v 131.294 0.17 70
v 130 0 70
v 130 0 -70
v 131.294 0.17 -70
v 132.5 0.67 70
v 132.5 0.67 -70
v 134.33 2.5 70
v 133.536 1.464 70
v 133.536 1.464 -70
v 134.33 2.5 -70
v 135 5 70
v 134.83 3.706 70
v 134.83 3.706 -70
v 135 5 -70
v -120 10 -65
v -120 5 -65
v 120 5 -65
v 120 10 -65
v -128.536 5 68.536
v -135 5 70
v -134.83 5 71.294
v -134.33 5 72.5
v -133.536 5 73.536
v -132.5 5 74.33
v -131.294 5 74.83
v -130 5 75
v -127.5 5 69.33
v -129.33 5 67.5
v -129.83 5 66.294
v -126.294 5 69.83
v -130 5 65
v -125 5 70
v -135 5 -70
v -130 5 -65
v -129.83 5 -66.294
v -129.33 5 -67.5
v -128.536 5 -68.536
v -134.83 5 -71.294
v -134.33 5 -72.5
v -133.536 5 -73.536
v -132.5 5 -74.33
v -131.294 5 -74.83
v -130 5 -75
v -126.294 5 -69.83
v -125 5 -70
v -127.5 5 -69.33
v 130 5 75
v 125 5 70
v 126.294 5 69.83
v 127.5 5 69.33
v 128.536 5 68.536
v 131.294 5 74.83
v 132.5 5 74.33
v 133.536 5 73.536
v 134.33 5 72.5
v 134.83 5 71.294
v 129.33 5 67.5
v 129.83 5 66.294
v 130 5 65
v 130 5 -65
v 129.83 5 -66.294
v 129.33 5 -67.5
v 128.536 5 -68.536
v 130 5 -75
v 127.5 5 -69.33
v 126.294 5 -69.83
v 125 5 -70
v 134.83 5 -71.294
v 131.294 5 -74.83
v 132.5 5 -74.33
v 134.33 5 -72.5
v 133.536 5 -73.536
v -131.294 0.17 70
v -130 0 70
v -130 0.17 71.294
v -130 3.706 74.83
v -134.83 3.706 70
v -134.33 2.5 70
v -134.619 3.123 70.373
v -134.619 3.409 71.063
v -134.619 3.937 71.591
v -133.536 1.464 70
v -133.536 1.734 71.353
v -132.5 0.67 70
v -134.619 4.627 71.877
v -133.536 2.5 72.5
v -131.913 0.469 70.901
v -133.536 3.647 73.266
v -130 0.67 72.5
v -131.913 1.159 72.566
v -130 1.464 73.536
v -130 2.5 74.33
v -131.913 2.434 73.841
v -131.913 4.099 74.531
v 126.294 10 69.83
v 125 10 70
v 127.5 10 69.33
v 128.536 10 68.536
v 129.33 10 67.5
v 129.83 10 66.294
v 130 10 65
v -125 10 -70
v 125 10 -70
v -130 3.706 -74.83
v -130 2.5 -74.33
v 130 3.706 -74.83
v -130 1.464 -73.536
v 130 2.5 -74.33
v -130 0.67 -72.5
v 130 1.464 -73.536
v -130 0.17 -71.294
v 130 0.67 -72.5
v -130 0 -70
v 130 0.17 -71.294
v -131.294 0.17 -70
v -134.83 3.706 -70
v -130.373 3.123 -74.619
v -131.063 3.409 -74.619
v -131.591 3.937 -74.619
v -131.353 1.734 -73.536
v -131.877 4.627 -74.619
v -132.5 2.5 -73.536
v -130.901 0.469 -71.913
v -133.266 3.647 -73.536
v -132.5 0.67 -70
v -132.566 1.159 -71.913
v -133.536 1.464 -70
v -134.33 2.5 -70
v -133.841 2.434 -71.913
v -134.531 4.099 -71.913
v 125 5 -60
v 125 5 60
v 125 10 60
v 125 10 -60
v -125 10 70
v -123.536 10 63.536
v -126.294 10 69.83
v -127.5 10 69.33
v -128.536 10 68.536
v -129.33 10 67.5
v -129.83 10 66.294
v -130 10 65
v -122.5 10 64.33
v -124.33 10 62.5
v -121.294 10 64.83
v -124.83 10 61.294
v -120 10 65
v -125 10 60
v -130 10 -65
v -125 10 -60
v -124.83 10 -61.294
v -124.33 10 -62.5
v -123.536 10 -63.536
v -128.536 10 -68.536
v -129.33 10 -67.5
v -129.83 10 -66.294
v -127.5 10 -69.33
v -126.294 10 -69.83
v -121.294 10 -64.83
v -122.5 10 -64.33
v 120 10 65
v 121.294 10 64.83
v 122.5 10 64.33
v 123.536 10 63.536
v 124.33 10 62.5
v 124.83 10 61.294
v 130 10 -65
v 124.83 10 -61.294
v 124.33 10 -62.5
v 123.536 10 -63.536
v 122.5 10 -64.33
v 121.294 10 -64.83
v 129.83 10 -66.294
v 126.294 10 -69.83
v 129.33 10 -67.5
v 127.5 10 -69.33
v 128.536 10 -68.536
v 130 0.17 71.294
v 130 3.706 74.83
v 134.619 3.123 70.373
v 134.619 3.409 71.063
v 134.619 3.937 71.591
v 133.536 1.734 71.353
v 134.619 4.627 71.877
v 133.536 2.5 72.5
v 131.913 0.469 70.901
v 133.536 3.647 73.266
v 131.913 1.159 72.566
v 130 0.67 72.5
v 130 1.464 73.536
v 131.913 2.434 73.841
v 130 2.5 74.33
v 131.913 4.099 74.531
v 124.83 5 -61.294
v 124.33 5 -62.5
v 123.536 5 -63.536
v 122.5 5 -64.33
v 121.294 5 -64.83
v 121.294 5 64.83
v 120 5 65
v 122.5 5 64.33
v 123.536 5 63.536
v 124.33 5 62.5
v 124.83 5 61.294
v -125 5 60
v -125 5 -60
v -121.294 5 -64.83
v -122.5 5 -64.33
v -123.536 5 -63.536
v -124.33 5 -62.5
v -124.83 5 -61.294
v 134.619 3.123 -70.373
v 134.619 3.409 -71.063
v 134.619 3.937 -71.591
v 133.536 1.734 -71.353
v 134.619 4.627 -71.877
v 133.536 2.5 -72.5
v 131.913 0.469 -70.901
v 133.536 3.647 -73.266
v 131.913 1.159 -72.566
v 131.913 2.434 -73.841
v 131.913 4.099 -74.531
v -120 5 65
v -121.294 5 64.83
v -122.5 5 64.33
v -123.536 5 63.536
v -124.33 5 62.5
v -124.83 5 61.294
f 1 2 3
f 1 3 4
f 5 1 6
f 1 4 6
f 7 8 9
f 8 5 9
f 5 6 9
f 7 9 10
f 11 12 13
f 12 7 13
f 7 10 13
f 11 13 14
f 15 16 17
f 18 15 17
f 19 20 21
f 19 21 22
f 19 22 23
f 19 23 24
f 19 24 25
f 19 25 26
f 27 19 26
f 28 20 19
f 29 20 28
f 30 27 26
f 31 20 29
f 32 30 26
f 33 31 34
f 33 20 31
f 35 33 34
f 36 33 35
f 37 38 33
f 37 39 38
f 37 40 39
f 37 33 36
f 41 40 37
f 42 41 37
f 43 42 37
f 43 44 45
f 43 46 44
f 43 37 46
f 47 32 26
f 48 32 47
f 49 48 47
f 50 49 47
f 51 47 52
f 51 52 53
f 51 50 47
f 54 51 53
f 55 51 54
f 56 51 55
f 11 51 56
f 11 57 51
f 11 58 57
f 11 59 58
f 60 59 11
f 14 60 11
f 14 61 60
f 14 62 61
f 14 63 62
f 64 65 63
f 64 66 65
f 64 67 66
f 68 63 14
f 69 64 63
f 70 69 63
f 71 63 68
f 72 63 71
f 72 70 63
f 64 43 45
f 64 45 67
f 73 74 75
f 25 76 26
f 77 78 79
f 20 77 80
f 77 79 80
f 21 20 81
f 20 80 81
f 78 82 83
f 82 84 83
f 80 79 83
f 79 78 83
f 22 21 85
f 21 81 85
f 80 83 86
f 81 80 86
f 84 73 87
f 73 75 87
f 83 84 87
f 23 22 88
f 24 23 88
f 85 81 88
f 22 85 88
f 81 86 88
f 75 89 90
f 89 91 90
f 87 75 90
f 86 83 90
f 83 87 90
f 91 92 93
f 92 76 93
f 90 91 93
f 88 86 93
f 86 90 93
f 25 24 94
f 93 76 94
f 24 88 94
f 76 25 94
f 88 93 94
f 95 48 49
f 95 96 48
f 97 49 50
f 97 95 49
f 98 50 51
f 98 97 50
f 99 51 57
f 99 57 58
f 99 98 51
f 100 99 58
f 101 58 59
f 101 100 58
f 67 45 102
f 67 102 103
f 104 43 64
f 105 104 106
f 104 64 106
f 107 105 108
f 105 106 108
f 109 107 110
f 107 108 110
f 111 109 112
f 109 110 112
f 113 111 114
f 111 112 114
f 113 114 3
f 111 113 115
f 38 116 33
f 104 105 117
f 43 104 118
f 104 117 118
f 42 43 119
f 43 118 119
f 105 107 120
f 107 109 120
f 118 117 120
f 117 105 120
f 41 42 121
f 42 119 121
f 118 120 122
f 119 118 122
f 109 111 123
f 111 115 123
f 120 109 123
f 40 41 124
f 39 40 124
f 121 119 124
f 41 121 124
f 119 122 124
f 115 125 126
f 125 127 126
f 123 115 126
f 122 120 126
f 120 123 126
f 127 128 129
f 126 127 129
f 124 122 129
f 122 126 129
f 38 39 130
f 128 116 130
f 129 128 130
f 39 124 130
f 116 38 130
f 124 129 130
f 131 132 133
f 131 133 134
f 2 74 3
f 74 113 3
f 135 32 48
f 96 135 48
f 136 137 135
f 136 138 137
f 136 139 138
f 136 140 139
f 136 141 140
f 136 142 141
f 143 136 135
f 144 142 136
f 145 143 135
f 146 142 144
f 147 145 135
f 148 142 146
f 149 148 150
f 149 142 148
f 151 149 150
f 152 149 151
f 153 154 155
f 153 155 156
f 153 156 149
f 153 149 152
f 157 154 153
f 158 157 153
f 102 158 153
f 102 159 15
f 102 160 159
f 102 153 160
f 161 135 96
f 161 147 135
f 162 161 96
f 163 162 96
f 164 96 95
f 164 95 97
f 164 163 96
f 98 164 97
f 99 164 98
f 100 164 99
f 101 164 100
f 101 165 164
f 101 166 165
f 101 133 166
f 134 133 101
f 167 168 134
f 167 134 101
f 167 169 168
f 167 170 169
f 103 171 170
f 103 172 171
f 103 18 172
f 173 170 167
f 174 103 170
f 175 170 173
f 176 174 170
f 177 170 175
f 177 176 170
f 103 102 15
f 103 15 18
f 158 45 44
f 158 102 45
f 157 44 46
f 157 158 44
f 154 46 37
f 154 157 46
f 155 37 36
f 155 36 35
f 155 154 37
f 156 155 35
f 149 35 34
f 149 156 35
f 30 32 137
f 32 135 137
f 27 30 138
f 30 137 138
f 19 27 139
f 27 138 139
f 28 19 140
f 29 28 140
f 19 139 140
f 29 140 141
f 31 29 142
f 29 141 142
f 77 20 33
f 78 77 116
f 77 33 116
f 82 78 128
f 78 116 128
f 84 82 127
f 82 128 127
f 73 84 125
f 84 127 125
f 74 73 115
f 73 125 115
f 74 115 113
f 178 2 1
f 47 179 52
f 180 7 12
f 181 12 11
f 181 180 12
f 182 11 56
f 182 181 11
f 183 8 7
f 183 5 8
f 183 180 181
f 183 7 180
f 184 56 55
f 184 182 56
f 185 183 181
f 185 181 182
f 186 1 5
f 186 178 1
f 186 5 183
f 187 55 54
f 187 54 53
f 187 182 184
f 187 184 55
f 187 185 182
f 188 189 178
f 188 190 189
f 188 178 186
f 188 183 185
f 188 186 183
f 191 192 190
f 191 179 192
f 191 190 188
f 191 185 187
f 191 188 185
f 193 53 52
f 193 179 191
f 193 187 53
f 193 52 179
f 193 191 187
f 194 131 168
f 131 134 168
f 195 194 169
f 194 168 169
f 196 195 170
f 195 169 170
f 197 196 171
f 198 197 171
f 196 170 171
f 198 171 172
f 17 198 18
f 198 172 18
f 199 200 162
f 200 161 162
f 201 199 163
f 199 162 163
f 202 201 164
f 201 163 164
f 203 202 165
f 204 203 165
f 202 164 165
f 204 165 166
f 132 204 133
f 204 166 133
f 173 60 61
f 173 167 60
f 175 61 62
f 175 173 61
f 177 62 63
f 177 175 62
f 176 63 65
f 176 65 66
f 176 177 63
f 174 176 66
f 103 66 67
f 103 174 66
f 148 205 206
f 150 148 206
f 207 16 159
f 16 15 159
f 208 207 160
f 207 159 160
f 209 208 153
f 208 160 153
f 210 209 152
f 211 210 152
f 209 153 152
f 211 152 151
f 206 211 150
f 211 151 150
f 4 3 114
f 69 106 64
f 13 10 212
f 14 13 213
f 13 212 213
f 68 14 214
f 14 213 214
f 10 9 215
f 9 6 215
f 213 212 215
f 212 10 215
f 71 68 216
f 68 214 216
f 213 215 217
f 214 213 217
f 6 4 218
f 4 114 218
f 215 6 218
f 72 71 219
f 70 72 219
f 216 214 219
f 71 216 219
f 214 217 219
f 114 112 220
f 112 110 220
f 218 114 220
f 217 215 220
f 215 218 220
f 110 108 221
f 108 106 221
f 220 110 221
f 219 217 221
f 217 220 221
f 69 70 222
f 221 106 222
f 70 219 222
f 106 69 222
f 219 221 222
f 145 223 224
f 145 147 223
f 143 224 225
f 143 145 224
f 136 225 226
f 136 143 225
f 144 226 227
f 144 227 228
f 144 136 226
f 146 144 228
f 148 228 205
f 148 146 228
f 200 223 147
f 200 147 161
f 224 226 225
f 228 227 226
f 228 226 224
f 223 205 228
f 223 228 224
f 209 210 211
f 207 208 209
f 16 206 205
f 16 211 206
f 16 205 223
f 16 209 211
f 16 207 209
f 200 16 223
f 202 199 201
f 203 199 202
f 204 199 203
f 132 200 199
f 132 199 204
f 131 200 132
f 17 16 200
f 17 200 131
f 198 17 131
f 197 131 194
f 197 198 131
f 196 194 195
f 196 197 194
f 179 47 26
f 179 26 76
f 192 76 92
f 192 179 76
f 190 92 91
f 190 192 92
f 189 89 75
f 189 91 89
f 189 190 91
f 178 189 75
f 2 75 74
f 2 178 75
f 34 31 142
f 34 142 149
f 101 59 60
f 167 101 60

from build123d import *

# Parameters (mm, degrees)
SKETCH1_W           = 270
SKETCH1_H           = 150
BOSS_EXTRUDE2_DEPTH = 5
SKETCH4_W           = 260
SKETCH4_H           = 140
SKETCH4_W_2         = 250
SKETCH4_H_2         = 130
BOSS_EXTRUDE3_DEPTH = 5
FILLET1_R           = 5


with BuildPart() as part:
    # Sketch1 → Boss-Extrude2 (new body)
    with BuildSketch(Plane(origin=(0, 0, 0), x_dir=(1, 0, 0), z_dir=(0, 1, 0))):
        Rectangle(SKETCH1_W, SKETCH1_H)
    extrude(amount=BOSS_EXTRUDE2_DEPTH)

    # Sketch4 → Boss-Extrude3 (add)
    with BuildSketch(Plane(origin=(0, 5, 0), x_dir=(1, 0, 0), z_dir=(0, 1, 0))):
        Rectangle(SKETCH4_W, SKETCH4_H)
        Rectangle(SKETCH4_W_2, SKETCH4_H_2, mode=Mode.SUBTRACT)
    extrude(amount=BOSS_EXTRUDE3_DEPTH)

    # Fillet1
    fillet1_edges = [part.edges().sort_by_distance(p)[0] for p in [
        (-130, 7.5, 70),
        (130, 7.5, 70),
        (130, 7.5, -70),
        (-130, 7.5, -70),
        (-125, 7.5, -65),
        (-125, 7.5, 65),
        (125, 7.5, 65),
        (125, 7.5, -65),
        (0, 0, 75),
        (-135, 0, 0),
        (0, 0, -75),
        (135, 0, 0),
        (135, 2.5, 75),
        (-135, 2.5, 75),
        (-135, 2.5, -75),
        (135, 2.5, -75),
    ]]
    fillet(fillet1_edges, radius=FILLET1_R - 0.0001)  # a hair under: the kernel refuses the full size


solid = part.part
